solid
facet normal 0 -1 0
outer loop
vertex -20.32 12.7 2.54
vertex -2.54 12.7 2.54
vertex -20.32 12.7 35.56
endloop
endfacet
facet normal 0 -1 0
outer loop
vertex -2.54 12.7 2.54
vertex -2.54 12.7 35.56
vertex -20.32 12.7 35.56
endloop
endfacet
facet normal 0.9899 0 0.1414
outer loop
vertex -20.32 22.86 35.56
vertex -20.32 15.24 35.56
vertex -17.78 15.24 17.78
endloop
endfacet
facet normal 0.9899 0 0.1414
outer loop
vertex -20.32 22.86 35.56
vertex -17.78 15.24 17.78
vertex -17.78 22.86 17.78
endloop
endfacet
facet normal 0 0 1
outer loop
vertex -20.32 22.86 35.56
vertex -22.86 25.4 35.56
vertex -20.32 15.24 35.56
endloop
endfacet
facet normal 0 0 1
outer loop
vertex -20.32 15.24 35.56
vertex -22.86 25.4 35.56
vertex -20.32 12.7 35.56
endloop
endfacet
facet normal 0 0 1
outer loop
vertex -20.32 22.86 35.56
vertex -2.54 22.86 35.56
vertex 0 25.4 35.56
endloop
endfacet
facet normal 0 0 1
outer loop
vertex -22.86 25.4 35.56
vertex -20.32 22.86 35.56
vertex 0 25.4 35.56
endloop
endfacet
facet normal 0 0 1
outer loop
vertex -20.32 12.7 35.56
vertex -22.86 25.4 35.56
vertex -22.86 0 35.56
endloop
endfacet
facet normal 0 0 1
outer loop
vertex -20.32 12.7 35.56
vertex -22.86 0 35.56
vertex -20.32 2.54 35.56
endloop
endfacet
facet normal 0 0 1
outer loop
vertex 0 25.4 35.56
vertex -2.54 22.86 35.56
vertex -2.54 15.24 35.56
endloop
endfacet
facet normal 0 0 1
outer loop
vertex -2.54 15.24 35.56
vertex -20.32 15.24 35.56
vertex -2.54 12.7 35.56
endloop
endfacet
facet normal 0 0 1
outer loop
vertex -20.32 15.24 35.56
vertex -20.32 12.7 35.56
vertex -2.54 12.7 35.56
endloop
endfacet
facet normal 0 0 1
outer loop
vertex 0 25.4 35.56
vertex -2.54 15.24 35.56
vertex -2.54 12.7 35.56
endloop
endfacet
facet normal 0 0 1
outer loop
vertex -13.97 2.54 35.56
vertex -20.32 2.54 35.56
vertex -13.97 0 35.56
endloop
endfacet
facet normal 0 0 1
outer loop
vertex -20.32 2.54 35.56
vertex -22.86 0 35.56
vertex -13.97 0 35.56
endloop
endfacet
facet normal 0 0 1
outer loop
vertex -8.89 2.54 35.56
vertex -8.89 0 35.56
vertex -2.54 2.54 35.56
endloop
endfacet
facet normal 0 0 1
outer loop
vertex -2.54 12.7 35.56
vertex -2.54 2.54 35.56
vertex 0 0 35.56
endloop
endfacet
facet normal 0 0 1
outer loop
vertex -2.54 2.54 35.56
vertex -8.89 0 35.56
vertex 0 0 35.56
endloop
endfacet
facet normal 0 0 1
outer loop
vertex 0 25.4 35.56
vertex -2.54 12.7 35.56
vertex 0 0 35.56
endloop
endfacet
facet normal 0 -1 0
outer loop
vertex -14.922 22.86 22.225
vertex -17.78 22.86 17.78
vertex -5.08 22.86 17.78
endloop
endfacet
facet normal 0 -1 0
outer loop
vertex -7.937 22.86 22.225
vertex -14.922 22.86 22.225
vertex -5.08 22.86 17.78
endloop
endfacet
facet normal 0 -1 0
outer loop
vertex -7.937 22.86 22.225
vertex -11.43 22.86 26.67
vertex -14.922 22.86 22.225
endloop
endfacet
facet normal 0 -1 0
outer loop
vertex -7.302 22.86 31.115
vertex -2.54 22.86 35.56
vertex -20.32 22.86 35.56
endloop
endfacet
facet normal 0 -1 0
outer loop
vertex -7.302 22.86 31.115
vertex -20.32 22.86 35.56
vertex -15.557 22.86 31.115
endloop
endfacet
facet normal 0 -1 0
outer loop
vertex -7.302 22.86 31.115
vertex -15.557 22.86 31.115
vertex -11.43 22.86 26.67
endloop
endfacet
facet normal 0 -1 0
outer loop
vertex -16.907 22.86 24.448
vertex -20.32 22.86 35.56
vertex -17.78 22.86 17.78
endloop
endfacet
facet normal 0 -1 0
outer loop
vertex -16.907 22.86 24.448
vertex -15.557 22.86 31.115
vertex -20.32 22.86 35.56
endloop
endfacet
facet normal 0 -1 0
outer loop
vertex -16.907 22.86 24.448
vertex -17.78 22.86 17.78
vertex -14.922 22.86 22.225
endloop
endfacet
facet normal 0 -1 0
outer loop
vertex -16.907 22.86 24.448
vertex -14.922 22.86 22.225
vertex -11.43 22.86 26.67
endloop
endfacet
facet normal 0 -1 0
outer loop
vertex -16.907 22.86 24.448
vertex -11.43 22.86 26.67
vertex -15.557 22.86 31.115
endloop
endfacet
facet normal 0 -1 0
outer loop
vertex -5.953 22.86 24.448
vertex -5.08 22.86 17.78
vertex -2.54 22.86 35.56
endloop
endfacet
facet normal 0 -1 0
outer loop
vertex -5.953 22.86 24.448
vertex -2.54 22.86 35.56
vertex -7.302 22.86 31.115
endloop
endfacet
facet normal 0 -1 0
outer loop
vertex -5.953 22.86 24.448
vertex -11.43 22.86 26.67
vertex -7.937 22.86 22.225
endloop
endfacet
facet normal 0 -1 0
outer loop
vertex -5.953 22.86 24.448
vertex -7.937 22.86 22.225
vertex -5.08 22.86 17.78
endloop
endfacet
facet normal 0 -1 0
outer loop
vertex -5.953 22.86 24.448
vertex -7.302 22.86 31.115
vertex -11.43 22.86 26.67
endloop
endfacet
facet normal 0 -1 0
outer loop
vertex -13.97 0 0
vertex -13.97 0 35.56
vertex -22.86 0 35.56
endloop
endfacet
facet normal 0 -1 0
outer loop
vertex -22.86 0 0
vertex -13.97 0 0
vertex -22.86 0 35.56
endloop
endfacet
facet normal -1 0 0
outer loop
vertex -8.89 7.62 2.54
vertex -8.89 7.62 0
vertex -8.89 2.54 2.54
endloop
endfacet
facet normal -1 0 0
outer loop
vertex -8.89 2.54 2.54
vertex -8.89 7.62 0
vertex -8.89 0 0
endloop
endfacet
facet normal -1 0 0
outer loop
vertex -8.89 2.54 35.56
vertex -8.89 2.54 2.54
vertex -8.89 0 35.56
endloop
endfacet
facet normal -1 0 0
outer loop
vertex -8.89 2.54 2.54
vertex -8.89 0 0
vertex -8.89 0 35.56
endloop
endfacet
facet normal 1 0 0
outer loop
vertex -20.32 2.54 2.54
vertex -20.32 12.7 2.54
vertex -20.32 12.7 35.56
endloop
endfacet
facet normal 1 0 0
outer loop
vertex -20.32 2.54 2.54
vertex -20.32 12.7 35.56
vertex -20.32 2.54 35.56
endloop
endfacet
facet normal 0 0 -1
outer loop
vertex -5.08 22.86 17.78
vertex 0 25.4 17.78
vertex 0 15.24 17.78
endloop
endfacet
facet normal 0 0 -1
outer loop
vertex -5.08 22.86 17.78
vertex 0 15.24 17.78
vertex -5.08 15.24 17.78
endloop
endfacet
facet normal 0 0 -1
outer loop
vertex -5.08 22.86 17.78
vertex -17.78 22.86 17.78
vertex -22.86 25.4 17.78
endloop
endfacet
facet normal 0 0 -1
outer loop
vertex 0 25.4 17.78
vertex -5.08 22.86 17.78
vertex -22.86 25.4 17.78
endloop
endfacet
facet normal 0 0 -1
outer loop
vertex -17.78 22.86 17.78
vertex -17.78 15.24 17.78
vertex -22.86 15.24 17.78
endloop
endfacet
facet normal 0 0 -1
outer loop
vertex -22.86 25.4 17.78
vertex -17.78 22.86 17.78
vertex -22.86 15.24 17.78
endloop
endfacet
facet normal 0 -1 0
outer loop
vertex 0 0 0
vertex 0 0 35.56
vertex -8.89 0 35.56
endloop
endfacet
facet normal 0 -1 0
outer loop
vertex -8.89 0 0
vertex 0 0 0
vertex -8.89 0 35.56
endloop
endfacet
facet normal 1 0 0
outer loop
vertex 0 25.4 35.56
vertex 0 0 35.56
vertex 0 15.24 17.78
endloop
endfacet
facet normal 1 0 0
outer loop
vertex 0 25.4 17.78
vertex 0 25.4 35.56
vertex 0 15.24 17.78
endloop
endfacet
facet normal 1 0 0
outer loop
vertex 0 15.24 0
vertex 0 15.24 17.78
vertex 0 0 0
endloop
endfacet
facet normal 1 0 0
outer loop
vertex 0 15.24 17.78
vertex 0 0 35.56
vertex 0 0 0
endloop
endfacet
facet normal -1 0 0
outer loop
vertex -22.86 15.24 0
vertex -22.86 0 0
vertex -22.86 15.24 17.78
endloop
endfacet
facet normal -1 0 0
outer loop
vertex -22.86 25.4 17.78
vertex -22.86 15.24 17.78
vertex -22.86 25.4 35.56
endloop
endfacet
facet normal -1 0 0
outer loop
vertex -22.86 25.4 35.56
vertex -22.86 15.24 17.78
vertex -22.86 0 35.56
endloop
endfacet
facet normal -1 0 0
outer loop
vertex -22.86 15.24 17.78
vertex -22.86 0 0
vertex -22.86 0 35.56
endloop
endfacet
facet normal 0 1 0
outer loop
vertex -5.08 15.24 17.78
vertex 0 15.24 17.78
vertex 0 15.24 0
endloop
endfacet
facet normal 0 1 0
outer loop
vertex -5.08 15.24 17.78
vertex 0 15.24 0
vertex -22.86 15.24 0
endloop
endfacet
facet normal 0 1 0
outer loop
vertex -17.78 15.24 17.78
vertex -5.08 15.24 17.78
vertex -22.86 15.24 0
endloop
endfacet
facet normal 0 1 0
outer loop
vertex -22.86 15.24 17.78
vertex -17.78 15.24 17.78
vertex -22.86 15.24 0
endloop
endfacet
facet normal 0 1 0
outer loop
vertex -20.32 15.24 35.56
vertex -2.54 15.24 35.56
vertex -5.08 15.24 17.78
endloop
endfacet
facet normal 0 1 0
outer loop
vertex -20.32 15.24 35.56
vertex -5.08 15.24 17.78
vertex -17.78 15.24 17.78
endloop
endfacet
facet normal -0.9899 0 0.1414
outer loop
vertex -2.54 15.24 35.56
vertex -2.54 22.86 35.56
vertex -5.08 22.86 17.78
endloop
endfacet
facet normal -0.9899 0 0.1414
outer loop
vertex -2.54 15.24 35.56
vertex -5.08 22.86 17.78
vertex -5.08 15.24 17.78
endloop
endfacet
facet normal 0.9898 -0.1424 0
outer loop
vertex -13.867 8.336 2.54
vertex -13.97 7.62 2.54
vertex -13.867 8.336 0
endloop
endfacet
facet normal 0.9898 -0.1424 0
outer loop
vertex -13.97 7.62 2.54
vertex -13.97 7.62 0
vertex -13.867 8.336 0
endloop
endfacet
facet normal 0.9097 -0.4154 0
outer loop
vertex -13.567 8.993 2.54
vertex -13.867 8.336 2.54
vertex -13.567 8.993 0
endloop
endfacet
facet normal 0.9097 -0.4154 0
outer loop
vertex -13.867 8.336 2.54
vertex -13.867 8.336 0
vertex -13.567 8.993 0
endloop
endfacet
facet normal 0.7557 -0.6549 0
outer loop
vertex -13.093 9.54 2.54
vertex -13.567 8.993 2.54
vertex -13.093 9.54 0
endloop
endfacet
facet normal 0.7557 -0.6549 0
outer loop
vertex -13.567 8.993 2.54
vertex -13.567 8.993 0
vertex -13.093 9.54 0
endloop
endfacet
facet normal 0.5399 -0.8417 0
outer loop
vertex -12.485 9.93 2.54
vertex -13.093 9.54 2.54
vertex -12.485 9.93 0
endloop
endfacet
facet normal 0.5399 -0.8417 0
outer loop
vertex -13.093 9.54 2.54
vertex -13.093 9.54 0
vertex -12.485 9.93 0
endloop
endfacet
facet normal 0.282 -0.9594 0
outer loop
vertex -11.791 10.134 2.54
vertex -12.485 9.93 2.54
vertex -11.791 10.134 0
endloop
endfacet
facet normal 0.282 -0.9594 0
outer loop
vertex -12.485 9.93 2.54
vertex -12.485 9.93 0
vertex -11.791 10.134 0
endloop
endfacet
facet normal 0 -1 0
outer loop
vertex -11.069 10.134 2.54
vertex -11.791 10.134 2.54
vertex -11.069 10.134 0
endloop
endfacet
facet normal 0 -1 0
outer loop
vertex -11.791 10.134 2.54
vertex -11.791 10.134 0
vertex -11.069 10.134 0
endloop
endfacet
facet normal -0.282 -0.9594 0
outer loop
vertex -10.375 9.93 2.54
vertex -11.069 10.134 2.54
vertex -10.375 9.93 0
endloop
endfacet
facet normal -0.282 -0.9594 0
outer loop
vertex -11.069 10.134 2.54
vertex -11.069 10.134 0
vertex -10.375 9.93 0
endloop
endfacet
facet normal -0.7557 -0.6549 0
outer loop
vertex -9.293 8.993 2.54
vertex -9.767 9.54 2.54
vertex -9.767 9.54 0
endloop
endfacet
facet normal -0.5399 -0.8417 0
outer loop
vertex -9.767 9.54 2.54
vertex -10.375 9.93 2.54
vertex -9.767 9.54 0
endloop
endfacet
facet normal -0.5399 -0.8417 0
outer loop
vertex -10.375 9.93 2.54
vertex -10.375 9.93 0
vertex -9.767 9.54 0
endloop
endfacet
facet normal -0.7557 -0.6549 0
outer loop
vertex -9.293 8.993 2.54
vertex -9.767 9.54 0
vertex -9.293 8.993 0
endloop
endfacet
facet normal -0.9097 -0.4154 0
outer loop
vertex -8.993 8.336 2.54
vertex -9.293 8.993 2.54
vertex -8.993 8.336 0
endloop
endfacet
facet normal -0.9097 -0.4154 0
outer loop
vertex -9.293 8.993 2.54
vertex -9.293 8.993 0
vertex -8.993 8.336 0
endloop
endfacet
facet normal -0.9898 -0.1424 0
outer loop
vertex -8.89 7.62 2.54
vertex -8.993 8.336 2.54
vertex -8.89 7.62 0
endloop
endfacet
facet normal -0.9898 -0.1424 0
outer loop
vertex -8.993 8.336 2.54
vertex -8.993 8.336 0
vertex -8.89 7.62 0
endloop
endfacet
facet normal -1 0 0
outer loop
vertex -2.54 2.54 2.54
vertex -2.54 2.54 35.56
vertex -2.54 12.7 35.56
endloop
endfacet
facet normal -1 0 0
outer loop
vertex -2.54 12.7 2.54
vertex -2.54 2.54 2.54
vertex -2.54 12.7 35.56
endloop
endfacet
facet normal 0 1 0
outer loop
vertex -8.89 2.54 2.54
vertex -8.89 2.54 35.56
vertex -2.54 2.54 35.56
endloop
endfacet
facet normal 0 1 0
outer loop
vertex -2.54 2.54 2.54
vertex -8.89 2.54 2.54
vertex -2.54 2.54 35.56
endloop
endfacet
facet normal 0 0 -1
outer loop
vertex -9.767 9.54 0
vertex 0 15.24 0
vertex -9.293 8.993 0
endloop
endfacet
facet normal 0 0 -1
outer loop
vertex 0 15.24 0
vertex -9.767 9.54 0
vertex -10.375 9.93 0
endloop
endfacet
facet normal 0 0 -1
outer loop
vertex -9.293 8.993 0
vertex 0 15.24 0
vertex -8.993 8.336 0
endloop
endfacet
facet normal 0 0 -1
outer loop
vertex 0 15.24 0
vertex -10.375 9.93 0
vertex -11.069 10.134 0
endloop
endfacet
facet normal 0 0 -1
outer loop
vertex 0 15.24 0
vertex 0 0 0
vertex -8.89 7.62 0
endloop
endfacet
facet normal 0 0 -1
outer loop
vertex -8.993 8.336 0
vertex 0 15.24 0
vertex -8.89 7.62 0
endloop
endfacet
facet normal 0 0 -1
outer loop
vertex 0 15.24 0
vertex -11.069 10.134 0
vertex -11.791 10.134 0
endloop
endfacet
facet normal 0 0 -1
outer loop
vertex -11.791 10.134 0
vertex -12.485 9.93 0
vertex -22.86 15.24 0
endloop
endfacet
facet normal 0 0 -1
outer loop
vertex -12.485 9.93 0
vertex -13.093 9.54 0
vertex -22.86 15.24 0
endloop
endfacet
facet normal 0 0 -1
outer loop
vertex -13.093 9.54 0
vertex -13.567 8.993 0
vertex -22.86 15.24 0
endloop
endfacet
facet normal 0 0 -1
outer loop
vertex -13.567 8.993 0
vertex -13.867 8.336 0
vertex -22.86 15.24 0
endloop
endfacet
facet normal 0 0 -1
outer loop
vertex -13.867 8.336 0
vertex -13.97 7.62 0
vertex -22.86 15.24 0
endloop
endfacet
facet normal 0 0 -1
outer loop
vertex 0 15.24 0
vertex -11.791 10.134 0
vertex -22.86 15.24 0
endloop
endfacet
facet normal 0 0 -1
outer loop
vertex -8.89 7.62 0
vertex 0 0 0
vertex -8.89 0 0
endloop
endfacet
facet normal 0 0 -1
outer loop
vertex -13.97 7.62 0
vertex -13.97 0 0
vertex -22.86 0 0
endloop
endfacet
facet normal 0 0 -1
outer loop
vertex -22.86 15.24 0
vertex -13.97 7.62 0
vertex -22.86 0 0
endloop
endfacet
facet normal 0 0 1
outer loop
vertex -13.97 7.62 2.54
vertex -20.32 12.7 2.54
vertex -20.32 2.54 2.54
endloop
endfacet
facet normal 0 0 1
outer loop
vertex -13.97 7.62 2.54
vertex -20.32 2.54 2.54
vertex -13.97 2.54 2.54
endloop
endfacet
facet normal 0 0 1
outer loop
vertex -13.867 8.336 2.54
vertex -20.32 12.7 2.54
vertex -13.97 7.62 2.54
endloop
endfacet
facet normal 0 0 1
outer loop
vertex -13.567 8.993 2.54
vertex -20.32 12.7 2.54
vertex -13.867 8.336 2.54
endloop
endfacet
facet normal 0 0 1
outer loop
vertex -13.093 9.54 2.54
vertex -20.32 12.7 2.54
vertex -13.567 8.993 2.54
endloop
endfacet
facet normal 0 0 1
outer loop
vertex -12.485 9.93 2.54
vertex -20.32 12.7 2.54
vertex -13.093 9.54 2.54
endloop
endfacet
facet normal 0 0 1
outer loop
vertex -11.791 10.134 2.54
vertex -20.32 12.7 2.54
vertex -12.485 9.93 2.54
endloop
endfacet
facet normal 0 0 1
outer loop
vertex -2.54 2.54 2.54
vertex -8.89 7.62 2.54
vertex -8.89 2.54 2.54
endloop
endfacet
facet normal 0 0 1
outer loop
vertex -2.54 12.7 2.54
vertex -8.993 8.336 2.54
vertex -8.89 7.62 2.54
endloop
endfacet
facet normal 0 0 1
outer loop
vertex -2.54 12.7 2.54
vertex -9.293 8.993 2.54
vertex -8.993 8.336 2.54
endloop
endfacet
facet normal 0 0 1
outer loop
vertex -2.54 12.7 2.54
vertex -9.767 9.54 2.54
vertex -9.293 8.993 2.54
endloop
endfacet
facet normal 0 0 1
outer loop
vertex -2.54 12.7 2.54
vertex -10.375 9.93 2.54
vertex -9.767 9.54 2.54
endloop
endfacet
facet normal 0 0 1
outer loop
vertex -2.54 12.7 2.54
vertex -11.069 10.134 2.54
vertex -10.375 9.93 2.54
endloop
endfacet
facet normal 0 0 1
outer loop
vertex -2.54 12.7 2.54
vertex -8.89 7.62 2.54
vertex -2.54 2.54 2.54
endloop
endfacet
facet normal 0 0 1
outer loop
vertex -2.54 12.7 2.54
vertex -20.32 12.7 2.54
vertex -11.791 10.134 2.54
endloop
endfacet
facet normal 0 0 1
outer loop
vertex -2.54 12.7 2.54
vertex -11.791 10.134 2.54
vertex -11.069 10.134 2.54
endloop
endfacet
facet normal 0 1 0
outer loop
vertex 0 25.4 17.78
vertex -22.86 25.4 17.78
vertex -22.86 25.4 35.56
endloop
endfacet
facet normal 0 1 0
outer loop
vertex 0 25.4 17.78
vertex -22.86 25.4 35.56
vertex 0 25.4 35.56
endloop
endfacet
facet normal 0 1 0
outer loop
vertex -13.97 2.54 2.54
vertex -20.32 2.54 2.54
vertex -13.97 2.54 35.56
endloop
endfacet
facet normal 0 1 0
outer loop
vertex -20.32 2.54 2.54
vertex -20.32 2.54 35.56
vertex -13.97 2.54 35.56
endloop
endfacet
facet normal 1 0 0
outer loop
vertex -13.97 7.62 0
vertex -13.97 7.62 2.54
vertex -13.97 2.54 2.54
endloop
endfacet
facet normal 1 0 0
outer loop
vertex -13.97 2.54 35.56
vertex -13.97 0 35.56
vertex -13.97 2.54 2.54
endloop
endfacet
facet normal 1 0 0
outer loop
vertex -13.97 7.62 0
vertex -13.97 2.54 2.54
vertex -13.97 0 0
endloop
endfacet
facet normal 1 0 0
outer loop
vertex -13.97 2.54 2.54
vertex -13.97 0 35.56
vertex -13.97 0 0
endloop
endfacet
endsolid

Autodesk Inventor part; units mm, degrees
ref_plane "YZ Plane" through (0, 0, 0) normal (1, 0, 0) x (0, 1, 0)
ref_plane "XZ Plane" through (0, 0, 0) normal (0, 1, 0) x (-1, 0, 0)
ref_plane "XY Plane" through (0, 0, 0) normal (0, 0, 1) x (1, 0, 0)
sketch "Sketch1" plane through (0, 0, 0) normal (0, 1, 0) x (-1, 0, 0)
  line L0 (0, 0) -> (22.86, 0)
  line L1 (22.86, 0) -> (22.86, 35.56)
  line L2 (22.86, 35.56) -> (0, 35.56)
  line L3 (0, 35.56) -> (0, 0)
  dimension "d0" = 22.86
  dimension "d1" = 35.56
extrude "Extrusion1" add sketch "Sketch1" along normal blind 15.24
sketch "Sketch2" plane through (-22.86, 0, 35.56) normal (0, 0, 1) x (1, 0, 0)
  line L0 (2.54, 2.54) -> (20.32, 2.54)
  line L1 (20.32, 2.54) -> (20.32, 12.7)
  line L2 (20.32, 12.7) -> (2.54, 12.7)
  line L3 (2.54, 12.7) -> (2.54, 2.54)
  point P0 (0, 0)
  dimension "d6" = 17.78
  dimension "d7" = 10.16
extrude "Extrusion2" cut sketch "Sketch2" against normal blind 33.02
sketch "Sketch5" plane through (0, 15.24, 0) normal (0, 1, 0) x (1, 0, 0)
  line L0 (-22.86, -35.56) -> (0, -35.56) projected
  line L1 (0, -35.56) -> (0, 0) projected
  line L2 (-22.86, -35.56) -> (0, -35.56)
  line L3 (0, -35.56) -> (0, -17.78)
  line L4 (0, -17.78) -> (-22.86, -17.78)
  line L5 (-22.86, -17.78) -> (-22.86, -35.56)
extrude "Extrusion5" add sketch "Sketch5" along normal blind 10.16
sketch "Sketch10" plane through (-22.86, 0, 35.56) normal (0, 0, 1) x (1, 0, 0)
  line L0 (2.54, 15.24) -> (20.32, 15.24)
  line L1 (20.32, 15.24) -> (20.32, 22.86)
  line L2 (20.32, 22.86) -> (2.54, 22.86)
  line L3 (2.54, 22.86) -> (2.54, 15.24)
  line L4 (2.54, 12.7) -> (20.32, 12.7) projected
  line L5 (22.86, 0) -> (22.86, 25.4) projected
  dimension "d27" = 17.78
  dimension "d28" = 7.62
  dimension "d29" = 2.54
  dimension "d30" = 2.54
sketch "Sketch11" plane through (0, 15.24, 17.78) normal (0, 0, -1) x (-1, 0, 0)
  line L0 (17.78, 7.62) -> (5.08, 7.62)
  line L1 (5.08, 7.62) -> (5.08, 0)
  line L2 (5.08, 0) -> (17.78, 0)
  line L3 (17.78, 0) -> (17.78, 7.62)
  line L4 (0, 10.16) -> (22.86, 10.16) projected
  line L5 (22.86, 0) -> (22.86, 10.16) projected
  point P0 (0, -15.24)
  dimension "d31" = 2.54
  dimension "d33" = 5.08
  dimension "d35" = 12.7
  dimension "d36" = 7.62
loft "Loft1" cut profiles "Sketch11", "Sketch10"
sketch "Sketch12" plane through (0, 0, 0) normal (0, 0, -1) x (-1, 0, 0)
  line L0 (22.86, 0) -> (0, 0) projected
  line L1 (0, 0) -> (11.43, 0)
  line L2 (11.43, 0) -> (11.43, 7.62)
  circle A0 centre (11.43, 7.62) radius 2.54
  dimension "d41" = 11.43
  dimension "d42" = 7.62
  dimension "d43" = 5.08
extrude "Extrusion8" cut sketch "Sketch12" against normal blind 25.4
sketch "Sketch13" plane through (0, 0, 0) normal (0, -1, 0) x (1, 0, 0)
  line L0 (0, 0) -> (-8.89, 0)
  line L1 (0, 0) -> (-22.86, 0) projected
  line L2 (-22.86, 0) -> (-13.97, 0)
  line L3 (-20.32, 35.56) -> (-2.54, 35.56) projected
  line L4 (-13.97, 0) -> (-8.89, 0)
  line L5 (-8.89, 0) -> (-8.89, 35.56)
  line L6 (-8.89, 35.56) -> (-13.97, 35.56)
  line L7 (-13.97, 35.56) -> (-13.97, 0)
  dimension "d46" = 8.89
  dimension "d47" = 8.89
extrude "Extrusion9" cut sketch "Sketch13" against normal blind 7.62
properties part number "big usb cover"
